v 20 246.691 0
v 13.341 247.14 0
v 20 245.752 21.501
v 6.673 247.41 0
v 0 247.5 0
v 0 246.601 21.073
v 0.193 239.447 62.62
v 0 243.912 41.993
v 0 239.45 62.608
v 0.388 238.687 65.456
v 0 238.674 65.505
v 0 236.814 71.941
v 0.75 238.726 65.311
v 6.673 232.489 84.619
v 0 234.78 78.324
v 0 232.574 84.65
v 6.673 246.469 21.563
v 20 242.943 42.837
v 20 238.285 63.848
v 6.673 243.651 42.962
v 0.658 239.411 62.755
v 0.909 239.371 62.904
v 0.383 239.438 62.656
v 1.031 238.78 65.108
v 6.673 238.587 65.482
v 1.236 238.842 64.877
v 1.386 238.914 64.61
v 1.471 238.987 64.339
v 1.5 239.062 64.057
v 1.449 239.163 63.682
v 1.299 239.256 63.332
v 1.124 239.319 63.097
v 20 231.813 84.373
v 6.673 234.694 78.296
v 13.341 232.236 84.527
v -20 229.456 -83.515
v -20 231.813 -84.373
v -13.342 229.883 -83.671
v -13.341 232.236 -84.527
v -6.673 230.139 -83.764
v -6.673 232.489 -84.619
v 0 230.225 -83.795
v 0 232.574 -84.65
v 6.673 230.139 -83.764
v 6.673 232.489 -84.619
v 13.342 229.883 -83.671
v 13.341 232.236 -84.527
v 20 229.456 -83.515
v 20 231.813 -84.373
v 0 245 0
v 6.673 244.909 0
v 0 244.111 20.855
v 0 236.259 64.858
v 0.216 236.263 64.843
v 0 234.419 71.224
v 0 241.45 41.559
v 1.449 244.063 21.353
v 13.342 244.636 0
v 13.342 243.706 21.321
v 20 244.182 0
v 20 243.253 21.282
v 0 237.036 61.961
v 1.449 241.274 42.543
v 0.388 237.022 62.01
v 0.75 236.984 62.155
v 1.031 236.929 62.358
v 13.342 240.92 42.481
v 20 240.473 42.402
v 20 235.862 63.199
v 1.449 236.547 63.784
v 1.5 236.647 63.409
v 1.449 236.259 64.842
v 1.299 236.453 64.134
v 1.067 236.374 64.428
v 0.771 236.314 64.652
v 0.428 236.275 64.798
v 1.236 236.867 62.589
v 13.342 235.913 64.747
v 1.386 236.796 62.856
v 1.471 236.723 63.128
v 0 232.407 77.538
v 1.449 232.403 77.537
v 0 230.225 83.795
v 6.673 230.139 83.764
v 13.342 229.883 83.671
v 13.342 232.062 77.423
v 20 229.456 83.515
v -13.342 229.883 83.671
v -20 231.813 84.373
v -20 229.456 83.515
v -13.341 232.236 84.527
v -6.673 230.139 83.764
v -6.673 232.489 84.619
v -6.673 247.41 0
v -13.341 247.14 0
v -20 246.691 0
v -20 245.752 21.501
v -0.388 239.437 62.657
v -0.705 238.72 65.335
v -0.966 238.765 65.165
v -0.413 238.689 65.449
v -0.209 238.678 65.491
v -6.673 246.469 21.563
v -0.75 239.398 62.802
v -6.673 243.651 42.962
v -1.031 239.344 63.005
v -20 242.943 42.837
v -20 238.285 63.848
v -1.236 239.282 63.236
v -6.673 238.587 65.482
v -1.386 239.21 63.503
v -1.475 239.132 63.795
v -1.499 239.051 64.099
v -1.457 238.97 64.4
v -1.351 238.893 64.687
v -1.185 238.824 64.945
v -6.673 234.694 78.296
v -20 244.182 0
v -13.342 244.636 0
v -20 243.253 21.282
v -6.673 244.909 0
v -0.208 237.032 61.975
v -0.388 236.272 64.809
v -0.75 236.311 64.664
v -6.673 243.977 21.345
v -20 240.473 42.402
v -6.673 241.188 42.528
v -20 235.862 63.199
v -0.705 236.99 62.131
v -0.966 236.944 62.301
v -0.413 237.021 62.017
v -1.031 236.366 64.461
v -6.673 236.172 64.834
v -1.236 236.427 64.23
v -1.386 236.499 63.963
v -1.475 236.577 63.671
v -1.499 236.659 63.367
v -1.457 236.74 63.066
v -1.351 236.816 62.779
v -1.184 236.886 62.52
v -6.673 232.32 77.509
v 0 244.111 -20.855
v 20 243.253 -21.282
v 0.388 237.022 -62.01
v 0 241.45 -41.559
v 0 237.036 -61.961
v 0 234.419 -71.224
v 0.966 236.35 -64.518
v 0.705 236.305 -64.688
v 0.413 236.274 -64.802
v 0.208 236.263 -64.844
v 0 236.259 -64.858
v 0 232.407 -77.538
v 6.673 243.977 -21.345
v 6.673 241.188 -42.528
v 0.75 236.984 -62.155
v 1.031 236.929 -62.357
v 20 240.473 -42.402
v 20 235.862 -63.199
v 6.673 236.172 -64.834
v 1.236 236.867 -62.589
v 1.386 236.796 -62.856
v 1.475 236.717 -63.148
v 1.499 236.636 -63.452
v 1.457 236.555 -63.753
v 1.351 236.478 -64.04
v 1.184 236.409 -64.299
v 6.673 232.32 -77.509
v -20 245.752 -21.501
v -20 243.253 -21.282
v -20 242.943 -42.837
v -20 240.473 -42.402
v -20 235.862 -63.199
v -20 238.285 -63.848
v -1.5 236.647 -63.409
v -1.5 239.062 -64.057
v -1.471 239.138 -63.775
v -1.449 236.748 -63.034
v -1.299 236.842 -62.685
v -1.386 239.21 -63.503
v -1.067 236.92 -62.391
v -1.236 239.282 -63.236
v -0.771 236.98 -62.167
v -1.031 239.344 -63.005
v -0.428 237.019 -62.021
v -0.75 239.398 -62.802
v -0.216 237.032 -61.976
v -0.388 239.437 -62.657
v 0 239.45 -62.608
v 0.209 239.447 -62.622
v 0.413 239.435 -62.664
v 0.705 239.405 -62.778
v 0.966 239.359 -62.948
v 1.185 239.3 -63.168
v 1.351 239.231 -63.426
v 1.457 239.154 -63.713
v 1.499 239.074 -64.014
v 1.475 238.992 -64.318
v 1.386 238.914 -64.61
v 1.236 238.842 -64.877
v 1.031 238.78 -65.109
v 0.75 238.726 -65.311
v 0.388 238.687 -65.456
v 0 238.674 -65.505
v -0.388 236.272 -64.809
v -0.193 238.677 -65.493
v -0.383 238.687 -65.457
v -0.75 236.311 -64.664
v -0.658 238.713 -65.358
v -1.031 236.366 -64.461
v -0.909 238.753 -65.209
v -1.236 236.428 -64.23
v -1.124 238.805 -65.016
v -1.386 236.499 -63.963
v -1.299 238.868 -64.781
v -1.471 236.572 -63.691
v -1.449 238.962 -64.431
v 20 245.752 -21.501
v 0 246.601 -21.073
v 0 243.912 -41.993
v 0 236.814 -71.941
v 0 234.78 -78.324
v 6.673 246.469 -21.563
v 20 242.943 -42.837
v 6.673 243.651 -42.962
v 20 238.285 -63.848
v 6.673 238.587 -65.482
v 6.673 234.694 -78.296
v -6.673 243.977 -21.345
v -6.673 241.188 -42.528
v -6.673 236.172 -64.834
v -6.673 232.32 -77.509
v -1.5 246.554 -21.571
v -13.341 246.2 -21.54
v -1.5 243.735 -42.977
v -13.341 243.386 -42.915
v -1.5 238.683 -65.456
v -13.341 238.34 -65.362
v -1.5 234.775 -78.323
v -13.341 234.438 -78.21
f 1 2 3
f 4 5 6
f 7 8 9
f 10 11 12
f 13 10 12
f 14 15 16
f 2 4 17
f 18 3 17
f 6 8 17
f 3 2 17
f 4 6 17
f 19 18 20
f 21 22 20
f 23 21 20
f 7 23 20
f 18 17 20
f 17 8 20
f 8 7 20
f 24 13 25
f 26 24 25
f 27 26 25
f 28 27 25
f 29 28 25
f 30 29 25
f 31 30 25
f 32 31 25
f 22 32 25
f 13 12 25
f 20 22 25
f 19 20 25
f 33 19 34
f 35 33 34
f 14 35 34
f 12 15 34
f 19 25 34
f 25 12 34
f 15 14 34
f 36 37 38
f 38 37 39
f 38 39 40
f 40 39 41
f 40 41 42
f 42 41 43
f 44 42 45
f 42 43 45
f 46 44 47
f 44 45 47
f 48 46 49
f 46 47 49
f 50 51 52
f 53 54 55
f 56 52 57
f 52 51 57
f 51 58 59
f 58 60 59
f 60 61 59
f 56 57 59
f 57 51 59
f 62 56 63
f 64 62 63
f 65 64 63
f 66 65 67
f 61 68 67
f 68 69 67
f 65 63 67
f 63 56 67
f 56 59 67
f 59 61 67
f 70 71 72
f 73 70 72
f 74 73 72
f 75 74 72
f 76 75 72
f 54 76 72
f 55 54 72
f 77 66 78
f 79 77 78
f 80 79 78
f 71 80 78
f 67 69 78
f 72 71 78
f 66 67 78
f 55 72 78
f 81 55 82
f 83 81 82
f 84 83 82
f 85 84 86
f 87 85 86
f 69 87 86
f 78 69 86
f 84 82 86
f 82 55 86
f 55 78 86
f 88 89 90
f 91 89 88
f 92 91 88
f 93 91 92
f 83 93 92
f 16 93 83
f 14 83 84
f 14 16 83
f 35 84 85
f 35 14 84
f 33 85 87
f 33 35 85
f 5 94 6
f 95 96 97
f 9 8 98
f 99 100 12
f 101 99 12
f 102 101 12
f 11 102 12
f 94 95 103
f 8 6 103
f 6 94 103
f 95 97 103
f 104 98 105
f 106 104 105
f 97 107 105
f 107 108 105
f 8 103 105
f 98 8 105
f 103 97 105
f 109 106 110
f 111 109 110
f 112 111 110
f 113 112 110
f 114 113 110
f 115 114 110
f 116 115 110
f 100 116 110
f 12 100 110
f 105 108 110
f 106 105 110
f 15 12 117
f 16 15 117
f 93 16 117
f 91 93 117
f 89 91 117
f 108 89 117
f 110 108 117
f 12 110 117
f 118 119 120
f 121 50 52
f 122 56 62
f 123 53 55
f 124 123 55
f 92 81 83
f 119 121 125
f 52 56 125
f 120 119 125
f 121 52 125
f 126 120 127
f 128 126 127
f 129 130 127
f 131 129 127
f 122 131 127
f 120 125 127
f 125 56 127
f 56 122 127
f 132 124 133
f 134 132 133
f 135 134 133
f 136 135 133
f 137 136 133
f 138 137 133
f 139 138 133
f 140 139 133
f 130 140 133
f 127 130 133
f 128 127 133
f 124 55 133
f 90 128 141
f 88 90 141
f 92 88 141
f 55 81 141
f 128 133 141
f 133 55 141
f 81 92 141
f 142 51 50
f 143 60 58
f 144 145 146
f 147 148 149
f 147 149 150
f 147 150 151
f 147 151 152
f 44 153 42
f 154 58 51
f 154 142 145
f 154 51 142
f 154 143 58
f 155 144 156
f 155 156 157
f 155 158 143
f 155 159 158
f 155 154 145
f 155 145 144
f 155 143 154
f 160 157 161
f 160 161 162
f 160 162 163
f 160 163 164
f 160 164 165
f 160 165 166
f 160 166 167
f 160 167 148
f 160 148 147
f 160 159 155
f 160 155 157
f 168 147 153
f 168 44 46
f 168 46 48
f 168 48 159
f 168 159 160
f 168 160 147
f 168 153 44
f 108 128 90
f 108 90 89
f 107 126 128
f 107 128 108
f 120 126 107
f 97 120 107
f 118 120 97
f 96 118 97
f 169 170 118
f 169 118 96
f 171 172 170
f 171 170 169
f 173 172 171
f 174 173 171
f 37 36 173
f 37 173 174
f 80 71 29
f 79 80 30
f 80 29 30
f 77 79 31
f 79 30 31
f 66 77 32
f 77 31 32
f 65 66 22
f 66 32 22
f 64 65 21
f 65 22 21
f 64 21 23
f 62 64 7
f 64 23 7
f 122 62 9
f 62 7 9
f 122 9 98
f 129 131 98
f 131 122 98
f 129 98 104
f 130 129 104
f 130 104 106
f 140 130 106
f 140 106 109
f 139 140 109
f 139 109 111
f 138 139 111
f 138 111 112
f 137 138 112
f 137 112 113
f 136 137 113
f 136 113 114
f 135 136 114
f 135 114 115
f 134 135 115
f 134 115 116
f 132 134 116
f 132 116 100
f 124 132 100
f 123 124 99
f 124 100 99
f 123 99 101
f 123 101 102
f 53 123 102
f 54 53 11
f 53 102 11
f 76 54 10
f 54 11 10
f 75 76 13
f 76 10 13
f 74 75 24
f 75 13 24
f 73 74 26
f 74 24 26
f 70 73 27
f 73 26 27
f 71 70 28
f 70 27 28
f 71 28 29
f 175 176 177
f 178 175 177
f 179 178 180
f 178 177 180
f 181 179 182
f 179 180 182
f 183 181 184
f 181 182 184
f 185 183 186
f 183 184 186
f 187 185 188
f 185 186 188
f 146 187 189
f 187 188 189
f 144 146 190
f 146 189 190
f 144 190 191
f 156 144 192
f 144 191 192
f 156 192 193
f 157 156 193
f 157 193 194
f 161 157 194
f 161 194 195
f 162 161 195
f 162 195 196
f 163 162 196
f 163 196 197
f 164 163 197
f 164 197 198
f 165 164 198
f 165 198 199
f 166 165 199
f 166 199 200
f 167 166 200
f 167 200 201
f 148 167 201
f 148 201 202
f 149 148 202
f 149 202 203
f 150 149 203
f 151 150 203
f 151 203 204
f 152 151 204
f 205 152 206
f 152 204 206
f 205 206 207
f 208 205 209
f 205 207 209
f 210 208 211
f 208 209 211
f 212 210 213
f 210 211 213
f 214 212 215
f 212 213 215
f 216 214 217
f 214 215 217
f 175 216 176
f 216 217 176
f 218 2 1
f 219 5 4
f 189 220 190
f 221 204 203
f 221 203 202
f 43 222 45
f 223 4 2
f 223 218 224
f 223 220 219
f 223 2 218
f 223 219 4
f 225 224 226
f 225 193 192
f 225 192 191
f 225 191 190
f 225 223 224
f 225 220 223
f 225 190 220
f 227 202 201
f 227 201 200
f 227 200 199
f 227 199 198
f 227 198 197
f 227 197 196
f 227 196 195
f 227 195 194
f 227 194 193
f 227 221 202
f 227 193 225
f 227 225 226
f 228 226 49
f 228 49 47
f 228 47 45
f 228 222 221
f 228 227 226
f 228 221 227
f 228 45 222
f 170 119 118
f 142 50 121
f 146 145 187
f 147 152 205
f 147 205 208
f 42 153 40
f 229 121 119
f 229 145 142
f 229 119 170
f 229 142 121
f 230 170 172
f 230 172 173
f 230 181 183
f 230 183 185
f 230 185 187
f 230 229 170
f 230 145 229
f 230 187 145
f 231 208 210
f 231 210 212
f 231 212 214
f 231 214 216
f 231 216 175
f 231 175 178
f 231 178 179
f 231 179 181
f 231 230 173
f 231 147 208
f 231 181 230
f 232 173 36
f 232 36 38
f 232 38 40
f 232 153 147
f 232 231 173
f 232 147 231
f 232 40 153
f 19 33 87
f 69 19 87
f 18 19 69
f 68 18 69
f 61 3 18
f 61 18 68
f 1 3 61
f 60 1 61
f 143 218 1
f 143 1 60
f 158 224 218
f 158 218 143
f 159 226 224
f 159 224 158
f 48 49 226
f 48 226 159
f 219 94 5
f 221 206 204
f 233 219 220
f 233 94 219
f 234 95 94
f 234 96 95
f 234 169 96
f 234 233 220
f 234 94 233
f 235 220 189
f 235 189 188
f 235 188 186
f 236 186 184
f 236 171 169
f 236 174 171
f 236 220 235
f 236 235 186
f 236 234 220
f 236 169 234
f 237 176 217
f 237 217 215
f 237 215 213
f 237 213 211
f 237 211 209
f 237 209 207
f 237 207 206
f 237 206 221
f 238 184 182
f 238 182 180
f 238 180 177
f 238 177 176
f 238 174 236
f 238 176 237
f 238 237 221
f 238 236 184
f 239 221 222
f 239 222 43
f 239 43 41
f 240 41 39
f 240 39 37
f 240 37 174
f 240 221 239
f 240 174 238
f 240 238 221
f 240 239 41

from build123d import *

# Parameters (mm, degrees)
REVOLVE1_ANGLE           = 20
REVOLVE1_OTHER_WAY_ANGLE = 20
SKETCH3_W                = 1.5
SKETCH3_H                = 54.140623468
CIRPATTERN2_COUNT        = 2


with BuildPart() as part:
    # Sketch1 → Revolve1 (revolve)
    with BuildSketch(Plane.XY):
        with BuildLine():
            ThreePointArc((-20, 244.182308941), (-10.008354244, 244.795491881), (0, 245))
            Line((0, 245), (0, 247.5))
            ThreePointArc((0, 247.5), (-10.008185841, 247.297566135), (-20, 246.690595686))
            Line((-20, 246.690595686), (-20, 244.182308941))
        make_face()
        with BuildLine():
            Line((0, 247.5), (0, 245))
            ThreePointArc((0, 245), (10.008354244, 244.795491881), (20, 244.182308941))
            Line((20, 244.182308941), (20, 246.690595686))
            ThreePointArc((20, 246.690595686), (10.008185841, 247.297566135), (0, 247.5))
        make_face()
    revolve(axis=Axis((-20, 0, 0), (1, 0, 0)), revolution_arc=REVOLVE1_ANGLE)

    # Sketch1 → Revolve1 other way (revolve)
    with BuildSketch(Plane.XY):
        with BuildLine():
            ThreePointArc((-20, 244.182308941), (-10.008354244, 244.795491881), (0, 245))
            Line((0, 245), (0, 247.5))
            ThreePointArc((0, 247.5), (-10.008185841, 247.297566135), (-20, 246.690595686))
            Line((-20, 246.690595686), (-20, 244.182308941))
        make_face()
        with BuildLine():
            Line((0, 247.5), (0, 245))
            ThreePointArc((0, 245), (10.008354244, 244.795491881), (20, 244.182308941))
            Line((20, 244.182308941), (20, 246.690595686))
            ThreePointArc((20, 246.690595686), (10.008185841, 247.297566135), (0, 247.5))
        make_face()
    revolve(axis=Axis((-20, 0, 0), (-1, 0, 0)), revolution_arc=REVOLVE1_OTHER_WAY_ANGLE)

    # Sketch3 → Cut-Revolve1 (revolve, cut)
    with BuildSketch(Plane(origin=(0, 0, 0), x_dir=(1, 0, 0), z_dir=(0, -0.258819045, 0.965925826))):
        with Locations((0.75, 245.792503526)):
            Rectangle(SKETCH3_W, SKETCH3_H)
    cut_revolve1 = revolve(axis=Axis((0, 0, 0), (0, 0.965925826, 0.258819045)), mode=Mode.SUBTRACT)

    # CirPattern2: Cut-Revolve1 ×2 about axis
    cirpattern2_axis = Axis((0, 0, 0), (0, 1, 0))
    for i in range(1, CIRPATTERN2_COUNT):
        add(cut_revolve1.rotate(cirpattern2_axis, i * 360 / CIRPATTERN2_COUNT), mode=Mode.SUBTRACT)


solid = part.part
